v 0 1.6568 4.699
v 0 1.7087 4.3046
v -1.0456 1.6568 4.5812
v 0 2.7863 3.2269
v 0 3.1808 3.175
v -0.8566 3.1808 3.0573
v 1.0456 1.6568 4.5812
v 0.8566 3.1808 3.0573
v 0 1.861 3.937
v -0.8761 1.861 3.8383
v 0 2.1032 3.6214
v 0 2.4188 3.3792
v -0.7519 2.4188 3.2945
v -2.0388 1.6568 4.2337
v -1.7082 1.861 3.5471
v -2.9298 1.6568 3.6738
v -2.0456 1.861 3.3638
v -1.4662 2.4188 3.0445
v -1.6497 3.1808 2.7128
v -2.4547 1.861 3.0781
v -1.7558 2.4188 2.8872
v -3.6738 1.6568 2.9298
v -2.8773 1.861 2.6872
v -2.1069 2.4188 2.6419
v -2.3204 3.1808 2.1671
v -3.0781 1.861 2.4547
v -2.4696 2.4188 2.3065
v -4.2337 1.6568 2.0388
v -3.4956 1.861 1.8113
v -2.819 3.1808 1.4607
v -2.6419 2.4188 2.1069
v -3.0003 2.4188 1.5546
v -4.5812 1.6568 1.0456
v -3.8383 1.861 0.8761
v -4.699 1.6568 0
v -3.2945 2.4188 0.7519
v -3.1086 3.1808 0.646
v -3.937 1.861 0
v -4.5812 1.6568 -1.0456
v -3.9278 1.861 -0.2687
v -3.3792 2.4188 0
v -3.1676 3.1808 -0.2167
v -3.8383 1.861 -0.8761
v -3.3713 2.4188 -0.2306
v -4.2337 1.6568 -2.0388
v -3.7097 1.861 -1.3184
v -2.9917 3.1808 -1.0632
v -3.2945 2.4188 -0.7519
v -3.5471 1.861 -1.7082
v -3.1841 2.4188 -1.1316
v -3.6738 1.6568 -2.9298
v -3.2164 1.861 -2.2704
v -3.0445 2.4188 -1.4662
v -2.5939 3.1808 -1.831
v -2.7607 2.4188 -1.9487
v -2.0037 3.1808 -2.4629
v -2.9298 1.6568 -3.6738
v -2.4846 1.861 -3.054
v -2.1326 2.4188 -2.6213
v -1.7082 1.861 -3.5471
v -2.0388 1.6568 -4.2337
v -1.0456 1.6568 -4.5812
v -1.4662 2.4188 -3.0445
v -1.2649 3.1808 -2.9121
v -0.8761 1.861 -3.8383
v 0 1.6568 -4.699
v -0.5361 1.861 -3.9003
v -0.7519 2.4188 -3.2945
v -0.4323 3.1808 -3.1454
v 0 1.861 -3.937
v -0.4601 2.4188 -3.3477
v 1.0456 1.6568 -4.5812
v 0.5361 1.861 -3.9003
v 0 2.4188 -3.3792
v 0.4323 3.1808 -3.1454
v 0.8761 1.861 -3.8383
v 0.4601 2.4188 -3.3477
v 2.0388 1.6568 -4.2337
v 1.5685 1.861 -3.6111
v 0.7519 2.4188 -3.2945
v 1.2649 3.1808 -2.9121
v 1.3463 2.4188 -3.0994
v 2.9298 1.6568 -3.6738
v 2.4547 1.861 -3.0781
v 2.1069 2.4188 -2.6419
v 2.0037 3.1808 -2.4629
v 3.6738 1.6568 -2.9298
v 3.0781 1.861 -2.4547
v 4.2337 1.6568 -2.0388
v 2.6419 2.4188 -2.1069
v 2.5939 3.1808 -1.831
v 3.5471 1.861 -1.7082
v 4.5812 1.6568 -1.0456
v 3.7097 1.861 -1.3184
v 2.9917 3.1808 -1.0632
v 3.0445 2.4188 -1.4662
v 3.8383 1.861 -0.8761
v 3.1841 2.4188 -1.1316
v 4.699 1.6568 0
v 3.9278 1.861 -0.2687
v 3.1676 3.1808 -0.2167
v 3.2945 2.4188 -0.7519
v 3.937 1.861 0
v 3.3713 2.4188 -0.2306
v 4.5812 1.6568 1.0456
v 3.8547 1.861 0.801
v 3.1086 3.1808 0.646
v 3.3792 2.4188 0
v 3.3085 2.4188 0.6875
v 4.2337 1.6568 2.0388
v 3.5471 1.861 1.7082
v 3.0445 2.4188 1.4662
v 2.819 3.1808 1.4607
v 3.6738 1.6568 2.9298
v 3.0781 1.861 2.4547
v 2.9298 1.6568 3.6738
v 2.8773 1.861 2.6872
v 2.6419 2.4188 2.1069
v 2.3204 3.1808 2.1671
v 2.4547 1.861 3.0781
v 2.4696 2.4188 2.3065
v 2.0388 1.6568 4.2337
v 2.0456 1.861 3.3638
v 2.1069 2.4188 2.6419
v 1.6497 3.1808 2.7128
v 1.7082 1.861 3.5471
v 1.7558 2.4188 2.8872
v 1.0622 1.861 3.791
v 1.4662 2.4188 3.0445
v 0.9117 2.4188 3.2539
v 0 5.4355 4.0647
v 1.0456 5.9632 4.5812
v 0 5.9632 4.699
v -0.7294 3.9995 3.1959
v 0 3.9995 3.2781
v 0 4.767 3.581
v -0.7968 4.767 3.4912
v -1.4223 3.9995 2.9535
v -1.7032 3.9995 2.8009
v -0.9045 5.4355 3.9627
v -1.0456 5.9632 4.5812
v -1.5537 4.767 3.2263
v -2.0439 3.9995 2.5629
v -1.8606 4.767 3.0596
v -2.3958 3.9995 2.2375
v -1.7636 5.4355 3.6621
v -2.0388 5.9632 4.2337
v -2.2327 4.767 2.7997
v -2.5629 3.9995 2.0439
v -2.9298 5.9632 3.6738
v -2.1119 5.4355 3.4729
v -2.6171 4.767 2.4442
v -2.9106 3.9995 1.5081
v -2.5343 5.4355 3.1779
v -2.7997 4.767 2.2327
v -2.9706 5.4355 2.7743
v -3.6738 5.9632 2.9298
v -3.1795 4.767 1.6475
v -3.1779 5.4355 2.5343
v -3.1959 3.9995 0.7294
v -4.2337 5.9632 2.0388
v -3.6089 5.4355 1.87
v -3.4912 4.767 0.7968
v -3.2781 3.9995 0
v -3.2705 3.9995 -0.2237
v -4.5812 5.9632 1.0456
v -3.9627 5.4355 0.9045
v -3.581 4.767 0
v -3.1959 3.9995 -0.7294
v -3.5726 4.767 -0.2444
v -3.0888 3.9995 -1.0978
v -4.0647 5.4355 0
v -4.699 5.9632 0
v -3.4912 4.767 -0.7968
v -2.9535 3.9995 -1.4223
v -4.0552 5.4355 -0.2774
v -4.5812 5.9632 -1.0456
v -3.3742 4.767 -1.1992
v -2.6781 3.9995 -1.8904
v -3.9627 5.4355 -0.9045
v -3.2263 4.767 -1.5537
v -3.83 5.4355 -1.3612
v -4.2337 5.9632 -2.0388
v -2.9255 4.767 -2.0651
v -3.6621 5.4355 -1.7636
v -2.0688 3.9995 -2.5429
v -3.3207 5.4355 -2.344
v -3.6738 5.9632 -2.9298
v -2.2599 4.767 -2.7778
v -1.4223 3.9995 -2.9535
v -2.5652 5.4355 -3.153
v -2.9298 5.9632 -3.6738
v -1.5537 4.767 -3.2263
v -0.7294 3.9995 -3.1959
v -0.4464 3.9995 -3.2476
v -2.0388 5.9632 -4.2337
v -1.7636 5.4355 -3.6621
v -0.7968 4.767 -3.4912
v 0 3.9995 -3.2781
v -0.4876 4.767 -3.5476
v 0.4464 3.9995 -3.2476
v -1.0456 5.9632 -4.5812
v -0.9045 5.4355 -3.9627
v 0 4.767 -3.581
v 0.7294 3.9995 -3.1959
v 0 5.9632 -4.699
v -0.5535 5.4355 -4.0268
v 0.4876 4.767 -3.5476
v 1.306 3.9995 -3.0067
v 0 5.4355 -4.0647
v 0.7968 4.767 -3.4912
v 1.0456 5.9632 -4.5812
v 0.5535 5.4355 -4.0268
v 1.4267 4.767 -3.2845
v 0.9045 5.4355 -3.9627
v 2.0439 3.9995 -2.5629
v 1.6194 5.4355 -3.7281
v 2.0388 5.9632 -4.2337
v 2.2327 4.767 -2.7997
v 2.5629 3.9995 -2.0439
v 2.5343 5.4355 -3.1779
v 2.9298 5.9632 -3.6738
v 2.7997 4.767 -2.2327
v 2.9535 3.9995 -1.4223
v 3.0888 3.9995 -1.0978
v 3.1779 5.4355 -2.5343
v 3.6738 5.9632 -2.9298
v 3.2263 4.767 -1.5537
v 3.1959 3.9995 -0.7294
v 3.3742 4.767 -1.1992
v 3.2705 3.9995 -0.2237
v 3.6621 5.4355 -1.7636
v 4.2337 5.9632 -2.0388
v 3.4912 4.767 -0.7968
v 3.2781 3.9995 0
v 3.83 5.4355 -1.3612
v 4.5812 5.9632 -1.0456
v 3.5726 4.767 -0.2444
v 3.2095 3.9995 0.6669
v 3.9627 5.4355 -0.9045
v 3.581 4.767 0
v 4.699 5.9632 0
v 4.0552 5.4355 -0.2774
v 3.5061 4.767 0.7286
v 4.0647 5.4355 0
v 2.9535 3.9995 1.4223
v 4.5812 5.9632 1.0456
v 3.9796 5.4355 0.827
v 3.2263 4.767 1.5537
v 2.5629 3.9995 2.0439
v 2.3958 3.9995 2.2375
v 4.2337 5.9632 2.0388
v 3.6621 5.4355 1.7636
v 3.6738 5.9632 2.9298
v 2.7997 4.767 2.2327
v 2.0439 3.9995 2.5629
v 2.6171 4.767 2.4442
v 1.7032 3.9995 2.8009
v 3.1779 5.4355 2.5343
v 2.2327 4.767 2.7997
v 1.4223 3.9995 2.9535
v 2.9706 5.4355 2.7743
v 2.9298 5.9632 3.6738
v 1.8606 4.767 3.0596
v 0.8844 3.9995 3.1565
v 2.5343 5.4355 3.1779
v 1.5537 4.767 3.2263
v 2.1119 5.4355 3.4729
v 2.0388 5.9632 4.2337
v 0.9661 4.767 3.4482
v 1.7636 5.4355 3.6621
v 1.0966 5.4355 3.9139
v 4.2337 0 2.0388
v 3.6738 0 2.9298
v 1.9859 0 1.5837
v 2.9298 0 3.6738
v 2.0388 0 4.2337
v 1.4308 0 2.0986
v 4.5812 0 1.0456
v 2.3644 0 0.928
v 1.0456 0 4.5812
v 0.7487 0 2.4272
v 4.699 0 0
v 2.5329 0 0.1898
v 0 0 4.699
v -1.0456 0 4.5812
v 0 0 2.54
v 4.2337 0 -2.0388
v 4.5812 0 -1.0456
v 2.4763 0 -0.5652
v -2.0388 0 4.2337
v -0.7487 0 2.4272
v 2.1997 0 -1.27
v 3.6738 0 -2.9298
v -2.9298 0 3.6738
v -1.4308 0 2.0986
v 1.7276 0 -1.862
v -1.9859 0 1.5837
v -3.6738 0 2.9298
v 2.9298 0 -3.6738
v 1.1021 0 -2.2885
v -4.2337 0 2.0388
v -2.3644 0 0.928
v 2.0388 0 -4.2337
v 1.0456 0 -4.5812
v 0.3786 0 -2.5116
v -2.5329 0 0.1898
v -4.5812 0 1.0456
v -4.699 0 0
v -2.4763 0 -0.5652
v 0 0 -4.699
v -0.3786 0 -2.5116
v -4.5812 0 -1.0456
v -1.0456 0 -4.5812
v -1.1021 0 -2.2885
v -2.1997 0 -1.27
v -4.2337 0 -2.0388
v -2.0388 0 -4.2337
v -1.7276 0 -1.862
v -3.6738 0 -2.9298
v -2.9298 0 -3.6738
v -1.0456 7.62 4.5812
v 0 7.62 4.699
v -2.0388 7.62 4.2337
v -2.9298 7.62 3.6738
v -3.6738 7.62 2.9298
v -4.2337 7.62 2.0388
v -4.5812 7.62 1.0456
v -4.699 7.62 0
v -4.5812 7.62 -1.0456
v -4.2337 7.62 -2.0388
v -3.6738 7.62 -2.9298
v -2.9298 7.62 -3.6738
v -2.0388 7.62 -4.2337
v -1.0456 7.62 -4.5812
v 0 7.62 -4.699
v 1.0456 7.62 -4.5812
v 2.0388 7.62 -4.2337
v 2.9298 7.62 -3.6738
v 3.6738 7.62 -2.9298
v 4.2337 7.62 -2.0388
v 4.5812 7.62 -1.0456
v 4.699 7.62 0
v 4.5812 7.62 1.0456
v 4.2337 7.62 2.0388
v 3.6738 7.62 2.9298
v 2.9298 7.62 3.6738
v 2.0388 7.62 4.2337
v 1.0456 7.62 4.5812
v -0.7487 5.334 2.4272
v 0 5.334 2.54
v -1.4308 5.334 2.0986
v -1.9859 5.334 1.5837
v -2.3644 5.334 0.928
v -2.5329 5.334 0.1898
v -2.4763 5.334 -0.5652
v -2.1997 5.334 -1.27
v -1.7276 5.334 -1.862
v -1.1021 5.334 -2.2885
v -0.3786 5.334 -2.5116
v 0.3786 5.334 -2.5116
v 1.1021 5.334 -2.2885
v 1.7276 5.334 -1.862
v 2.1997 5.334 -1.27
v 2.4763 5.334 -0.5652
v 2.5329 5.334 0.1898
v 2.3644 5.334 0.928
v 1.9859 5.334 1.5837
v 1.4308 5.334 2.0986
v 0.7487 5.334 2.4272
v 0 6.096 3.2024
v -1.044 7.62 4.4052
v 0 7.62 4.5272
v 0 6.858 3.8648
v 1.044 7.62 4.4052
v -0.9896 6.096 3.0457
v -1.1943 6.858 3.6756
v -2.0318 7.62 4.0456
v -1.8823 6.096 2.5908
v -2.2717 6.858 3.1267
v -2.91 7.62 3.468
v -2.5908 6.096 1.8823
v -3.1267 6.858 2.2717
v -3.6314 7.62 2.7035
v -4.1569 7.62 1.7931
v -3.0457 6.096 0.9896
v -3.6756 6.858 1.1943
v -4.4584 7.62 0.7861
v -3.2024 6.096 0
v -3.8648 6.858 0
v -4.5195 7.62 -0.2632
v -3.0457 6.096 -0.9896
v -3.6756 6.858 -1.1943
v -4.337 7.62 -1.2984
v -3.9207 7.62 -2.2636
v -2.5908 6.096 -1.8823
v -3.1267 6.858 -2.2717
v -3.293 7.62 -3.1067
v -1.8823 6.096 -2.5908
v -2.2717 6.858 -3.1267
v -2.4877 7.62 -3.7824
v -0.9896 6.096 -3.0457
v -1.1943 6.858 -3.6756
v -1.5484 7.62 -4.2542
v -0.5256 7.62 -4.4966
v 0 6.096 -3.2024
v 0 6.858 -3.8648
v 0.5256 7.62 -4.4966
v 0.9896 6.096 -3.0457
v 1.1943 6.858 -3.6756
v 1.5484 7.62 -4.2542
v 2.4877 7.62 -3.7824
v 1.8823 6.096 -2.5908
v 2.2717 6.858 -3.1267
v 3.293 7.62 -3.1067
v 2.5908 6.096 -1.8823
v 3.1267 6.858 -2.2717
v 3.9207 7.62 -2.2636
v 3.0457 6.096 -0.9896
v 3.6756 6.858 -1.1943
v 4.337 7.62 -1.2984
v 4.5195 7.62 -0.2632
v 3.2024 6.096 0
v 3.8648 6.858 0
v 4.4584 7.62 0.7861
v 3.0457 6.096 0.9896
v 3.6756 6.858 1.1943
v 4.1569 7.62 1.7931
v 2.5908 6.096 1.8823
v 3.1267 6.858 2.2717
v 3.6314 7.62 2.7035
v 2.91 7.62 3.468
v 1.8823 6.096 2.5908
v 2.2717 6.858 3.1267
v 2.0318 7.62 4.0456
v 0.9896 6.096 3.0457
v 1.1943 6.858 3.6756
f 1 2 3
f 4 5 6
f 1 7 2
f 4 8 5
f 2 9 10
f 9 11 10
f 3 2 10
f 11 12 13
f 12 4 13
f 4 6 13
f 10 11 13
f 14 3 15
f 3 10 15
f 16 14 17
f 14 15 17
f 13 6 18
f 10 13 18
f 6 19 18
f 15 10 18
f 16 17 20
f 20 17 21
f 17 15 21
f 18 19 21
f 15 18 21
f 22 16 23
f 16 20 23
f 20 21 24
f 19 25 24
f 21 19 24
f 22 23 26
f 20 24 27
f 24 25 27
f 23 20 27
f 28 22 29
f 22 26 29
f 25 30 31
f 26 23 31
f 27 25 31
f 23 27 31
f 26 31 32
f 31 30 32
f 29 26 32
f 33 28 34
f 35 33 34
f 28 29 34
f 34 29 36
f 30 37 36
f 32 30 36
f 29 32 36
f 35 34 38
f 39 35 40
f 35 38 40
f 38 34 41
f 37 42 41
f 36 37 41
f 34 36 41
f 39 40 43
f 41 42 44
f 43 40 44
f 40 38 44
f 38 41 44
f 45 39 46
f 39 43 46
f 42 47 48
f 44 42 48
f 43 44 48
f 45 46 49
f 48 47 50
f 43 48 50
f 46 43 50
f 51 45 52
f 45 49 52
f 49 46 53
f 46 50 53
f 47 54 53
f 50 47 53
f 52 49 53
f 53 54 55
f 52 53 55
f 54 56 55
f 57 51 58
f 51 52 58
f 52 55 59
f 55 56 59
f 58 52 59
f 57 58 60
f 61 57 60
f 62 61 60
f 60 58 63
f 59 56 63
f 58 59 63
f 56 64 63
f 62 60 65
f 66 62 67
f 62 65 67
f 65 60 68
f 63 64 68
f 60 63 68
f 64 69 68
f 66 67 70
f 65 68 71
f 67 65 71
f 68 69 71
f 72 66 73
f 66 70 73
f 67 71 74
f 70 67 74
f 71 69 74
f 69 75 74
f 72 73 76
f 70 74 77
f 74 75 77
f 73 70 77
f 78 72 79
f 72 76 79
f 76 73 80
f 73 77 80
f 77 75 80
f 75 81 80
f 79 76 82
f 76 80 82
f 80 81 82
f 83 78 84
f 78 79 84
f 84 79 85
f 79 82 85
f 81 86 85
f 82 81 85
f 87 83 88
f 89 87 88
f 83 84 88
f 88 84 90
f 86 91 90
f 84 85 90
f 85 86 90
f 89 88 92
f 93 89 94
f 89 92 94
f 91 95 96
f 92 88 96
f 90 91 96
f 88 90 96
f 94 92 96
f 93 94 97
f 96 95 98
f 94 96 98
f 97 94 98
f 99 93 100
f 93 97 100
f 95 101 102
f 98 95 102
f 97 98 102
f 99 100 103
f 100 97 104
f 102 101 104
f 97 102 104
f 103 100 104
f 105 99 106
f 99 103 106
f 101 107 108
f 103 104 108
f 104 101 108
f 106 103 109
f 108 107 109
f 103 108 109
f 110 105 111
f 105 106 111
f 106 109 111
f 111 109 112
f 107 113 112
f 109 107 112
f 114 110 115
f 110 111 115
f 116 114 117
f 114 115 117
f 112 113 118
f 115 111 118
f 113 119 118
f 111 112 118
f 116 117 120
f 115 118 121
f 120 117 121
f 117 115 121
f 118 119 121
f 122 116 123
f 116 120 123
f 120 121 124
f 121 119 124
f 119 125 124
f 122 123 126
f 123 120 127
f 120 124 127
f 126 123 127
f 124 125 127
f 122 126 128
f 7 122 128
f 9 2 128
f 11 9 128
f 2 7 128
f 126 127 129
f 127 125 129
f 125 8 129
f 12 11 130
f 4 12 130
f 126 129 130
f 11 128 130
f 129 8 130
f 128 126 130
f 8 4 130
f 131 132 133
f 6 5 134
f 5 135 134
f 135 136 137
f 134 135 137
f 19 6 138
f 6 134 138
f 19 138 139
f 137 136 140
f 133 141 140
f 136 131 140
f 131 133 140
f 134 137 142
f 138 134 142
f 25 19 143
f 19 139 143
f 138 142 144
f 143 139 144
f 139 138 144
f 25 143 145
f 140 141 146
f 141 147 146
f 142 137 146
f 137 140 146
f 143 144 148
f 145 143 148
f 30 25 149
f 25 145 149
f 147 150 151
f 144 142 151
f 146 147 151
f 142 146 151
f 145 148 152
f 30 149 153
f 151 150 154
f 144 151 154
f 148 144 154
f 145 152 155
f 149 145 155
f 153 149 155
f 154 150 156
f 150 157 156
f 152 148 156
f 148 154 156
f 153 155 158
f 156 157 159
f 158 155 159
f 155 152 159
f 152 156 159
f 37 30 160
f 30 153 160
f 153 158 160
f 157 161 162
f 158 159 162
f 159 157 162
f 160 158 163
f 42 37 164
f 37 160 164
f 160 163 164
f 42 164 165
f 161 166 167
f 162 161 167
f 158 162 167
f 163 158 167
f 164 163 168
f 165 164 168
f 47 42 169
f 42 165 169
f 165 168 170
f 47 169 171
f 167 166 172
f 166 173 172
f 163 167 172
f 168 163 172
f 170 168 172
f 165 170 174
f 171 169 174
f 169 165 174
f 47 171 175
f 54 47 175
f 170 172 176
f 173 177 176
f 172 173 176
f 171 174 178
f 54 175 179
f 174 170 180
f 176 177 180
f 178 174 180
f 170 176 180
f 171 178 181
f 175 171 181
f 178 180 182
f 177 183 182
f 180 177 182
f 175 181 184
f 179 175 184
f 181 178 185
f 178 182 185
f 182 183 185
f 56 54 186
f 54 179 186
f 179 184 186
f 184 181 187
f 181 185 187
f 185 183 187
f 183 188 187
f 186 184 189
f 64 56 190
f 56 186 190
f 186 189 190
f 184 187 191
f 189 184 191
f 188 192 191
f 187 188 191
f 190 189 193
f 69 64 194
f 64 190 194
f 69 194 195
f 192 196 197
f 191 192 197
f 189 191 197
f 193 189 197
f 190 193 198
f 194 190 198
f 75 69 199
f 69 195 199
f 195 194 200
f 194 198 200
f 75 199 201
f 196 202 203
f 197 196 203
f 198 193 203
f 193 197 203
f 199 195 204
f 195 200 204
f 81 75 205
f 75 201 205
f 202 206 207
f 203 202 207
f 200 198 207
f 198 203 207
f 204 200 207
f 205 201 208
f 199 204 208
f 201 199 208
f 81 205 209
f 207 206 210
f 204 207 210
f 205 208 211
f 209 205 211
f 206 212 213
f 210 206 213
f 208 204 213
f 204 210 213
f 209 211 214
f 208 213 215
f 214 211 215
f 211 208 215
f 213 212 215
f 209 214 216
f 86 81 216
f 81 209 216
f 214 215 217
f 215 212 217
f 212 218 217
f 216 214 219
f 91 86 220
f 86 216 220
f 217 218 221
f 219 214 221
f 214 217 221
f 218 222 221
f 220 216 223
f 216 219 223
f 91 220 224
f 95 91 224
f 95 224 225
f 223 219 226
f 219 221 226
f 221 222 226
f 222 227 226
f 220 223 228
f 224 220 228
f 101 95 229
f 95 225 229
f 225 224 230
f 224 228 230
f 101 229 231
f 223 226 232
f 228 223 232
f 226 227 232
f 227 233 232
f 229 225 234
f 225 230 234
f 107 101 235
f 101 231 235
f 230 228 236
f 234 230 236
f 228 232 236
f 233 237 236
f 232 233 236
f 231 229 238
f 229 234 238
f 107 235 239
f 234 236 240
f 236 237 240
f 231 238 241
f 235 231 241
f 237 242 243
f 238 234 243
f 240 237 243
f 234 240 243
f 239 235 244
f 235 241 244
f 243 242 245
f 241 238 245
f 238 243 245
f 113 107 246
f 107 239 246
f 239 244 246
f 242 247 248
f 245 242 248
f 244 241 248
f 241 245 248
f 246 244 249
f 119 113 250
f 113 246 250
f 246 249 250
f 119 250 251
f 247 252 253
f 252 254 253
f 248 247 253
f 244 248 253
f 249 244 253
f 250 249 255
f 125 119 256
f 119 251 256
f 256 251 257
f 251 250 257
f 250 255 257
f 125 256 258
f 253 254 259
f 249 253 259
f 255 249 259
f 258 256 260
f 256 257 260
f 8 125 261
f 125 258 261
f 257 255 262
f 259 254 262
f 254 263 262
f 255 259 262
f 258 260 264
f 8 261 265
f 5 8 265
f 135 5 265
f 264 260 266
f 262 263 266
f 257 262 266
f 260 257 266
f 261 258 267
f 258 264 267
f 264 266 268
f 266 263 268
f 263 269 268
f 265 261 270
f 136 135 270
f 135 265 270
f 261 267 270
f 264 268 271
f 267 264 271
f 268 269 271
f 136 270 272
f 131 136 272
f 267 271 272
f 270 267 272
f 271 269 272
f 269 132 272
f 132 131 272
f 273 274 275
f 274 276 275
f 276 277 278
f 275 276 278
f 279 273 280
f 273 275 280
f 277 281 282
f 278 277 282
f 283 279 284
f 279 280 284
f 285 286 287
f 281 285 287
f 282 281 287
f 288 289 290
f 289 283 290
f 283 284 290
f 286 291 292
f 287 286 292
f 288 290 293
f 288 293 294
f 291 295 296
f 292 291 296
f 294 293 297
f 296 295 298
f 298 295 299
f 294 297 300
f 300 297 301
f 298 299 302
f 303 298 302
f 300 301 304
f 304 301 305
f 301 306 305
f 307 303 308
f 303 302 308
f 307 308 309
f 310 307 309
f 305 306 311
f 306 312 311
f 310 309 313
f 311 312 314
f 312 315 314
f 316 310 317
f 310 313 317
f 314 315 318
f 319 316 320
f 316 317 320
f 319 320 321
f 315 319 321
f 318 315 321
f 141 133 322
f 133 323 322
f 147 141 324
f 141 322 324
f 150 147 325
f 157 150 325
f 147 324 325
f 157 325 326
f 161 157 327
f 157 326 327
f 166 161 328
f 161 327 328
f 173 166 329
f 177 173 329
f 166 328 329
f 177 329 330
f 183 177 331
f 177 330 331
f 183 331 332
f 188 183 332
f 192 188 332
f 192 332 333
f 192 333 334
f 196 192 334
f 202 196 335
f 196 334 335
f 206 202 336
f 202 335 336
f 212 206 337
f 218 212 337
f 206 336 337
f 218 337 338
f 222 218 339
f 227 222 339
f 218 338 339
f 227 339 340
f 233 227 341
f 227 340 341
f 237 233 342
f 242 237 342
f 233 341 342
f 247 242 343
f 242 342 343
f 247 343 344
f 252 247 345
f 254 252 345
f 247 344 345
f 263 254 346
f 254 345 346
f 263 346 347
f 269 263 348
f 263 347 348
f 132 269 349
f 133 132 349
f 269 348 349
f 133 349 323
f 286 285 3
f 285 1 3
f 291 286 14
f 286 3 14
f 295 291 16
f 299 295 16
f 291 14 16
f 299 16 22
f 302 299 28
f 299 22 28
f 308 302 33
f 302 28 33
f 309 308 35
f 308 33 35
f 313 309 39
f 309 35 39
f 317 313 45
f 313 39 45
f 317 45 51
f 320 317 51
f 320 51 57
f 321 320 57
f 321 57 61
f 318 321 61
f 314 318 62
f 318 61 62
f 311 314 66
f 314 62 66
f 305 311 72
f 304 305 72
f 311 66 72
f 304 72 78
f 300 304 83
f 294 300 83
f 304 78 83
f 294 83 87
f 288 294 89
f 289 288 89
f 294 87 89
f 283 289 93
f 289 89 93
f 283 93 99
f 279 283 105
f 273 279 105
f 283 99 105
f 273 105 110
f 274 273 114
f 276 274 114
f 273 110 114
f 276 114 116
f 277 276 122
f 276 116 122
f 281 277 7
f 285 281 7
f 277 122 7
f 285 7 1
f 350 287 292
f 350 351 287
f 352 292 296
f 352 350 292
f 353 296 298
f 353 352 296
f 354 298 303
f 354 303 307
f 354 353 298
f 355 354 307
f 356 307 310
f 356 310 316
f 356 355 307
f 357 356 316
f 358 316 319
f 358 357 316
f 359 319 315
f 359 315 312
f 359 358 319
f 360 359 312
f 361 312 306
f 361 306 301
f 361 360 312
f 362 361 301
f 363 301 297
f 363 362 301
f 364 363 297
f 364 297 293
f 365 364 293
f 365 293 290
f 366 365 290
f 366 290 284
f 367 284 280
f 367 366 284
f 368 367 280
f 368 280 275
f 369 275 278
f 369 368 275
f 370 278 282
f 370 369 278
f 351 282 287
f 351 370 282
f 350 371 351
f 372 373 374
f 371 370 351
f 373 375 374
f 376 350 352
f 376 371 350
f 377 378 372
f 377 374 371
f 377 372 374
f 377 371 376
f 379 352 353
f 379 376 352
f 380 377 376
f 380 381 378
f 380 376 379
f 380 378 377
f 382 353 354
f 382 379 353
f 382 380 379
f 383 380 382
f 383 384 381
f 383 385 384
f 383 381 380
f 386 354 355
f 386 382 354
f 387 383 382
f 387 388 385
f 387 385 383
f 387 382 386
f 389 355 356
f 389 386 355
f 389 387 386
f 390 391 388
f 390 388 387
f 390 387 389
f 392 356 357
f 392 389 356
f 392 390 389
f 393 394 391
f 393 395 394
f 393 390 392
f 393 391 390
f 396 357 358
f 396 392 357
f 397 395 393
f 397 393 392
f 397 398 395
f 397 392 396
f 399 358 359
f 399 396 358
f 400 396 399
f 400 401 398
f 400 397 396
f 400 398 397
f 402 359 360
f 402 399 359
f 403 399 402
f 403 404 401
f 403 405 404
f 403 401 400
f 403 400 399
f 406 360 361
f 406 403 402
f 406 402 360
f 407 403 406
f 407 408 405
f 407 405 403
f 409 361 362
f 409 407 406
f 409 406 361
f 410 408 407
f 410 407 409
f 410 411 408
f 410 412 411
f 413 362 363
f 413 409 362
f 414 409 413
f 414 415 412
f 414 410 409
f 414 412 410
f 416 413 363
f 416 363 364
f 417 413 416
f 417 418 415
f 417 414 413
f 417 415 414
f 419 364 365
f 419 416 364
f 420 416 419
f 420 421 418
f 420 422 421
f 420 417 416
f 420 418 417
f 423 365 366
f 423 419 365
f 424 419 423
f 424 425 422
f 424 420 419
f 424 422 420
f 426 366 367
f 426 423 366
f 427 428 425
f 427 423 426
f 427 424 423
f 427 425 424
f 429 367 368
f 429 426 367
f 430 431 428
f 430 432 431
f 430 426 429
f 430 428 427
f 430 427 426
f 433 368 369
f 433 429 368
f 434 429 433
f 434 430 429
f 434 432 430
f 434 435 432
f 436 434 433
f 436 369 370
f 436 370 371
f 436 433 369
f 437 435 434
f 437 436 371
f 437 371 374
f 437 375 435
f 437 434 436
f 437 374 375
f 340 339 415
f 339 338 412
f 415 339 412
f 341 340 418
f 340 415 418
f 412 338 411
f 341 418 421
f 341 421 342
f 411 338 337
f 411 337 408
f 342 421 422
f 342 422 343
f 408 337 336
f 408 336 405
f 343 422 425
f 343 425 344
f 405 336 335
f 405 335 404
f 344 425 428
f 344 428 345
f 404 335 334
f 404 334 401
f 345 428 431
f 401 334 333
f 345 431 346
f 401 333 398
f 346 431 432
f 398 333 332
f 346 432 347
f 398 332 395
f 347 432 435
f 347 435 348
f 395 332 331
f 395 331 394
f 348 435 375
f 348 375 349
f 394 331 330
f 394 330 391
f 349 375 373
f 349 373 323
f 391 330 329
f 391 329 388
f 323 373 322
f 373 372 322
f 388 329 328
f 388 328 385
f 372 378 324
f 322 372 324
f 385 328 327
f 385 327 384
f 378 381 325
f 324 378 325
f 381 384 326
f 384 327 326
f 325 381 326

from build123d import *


with BuildPart() as part:
    # Sketch1 → Revolve1 (revolve)
    with BuildSketch(Plane.XY, mode=Mode.PRIVATE) as revolve1_sk:
        with BuildLine():
            Line((0, 0), (4.699, 0))
            Line((4.699, 0), (4.699, 1.656784628))
            ThreePointArc((4.699, 1.656784628), (3.621369312, 2.103153847), (3.175, 3.180784498))
            ThreePointArc((3.175, 3.180784498), (3.580954352, 4.767014148), (4.699, 5.963215372))
            Line((4.699, 5.963215372), (4.699, 7.62))
            Line((4.699, 7.62), (0, 7.62))
            Line((0, 7.62), (0, 0))
        make_face()
    revolve(revolve1_sk.sketch.rotate(Axis((0, 7.62, 0), (0, -1, 0)), 90), axis=Axis((0, 7.62, 0), (0, -1, 0)))

    # Sketch2 → Cut-Revolve1 (revolve, cut)
    with BuildSketch(Plane.XY, mode=Mode.PRIVATE) as cut_revolve1_sk:
        Polygon((0, 0), (2.54, 0), (2.54, 5.334), (4.527189483, 7.62), (0, 7.62), align=None)
    revolve(cut_revolve1_sk.sketch.rotate(Axis((0, 7.62, 0), (0, -1, 0)), 90), axis=Axis((0, 7.62, 0), (0, -1, 0)), mode=Mode.SUBTRACT)


solid = part.part
